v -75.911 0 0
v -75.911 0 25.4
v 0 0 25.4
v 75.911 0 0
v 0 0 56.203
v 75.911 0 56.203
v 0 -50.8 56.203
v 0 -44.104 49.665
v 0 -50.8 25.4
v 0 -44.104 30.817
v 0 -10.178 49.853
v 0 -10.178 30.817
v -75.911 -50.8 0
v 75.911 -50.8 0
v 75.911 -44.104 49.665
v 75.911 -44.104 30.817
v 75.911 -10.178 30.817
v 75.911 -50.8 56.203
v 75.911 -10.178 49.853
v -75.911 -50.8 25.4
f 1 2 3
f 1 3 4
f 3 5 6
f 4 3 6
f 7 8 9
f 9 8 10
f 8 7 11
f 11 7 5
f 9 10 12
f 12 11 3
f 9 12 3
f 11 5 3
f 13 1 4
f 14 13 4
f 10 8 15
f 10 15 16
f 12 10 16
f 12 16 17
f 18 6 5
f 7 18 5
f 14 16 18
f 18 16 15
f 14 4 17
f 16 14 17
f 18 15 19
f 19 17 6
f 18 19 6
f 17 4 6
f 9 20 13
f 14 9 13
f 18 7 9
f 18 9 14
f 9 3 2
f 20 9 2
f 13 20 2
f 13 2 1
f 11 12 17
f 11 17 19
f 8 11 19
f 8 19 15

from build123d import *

# Parameters (mm, degrees)
F1_DEPTH = 50.8
F3_DEPTH = 92.51427


with BuildPart() as f1:
    # F0 (on Front) → F1 (new body)
    with BuildSketch(Plane.XZ):
        Polygon((75.910531, 56.202993), (0, 56.202993), (0, 25.4), (-75.910531, 25.4), (-75.910531, 0), (75.910531, 0), align=None)
    extrude(amount=F1_DEPTH)

    # F2 (on Right) → F3 (cut)
    with BuildSketch(Plane.YZ):
        Polygon((-10.17795, 30.816574), (-10.17795, 49.853109), (-44.104453, 49.664631), (-44.104453, 30.816574), align=None)
    extrude(amount=F3_DEPTH, mode=Mode.SUBTRACT)


solid = f1.part
